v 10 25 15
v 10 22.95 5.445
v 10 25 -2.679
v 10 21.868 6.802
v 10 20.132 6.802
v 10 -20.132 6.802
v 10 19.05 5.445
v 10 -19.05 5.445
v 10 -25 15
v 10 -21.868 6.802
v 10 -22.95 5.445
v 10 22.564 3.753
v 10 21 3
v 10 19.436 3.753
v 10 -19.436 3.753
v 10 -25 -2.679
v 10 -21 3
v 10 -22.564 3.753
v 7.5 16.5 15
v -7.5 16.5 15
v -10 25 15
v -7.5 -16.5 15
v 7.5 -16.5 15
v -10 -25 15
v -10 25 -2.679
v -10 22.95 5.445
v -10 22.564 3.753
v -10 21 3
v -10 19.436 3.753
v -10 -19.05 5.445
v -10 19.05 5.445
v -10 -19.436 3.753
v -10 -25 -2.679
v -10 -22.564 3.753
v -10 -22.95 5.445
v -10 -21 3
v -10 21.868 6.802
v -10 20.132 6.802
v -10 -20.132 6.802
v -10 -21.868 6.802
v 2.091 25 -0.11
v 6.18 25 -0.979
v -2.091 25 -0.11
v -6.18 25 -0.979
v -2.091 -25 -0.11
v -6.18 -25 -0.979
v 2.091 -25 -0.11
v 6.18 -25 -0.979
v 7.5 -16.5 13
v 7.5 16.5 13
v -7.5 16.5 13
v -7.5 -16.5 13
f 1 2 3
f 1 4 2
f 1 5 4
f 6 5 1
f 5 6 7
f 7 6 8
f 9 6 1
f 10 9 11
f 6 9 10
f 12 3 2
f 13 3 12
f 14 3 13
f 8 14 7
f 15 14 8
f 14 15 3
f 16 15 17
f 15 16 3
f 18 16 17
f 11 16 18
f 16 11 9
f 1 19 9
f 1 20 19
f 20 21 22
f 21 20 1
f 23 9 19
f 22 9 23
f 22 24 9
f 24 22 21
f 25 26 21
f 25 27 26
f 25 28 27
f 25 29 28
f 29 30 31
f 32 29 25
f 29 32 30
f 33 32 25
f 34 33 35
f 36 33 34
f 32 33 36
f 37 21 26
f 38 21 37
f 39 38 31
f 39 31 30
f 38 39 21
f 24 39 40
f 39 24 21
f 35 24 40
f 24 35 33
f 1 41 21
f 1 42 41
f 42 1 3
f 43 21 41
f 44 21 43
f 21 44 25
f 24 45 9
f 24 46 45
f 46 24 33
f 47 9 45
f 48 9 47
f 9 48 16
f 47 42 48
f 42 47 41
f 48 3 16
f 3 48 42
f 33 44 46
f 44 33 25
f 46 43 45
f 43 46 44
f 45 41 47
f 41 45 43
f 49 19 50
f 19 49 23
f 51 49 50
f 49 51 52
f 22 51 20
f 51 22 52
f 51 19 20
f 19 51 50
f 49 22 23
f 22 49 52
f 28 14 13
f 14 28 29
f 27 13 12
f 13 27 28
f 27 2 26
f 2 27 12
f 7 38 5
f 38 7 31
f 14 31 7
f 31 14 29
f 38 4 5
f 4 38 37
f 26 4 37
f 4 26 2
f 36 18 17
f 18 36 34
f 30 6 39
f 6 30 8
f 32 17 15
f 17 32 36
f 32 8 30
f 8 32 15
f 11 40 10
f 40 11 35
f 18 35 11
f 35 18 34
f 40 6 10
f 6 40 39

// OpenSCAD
difference(){
    cube([20,50,30],center = true);
    
    translate([0,0,-20]){
        rotate([90,0,0]){
            cylinder(h=60, r=20, center=true);
        }
    }
    translate([0,0,15]){
        cube([15, 33, 4],center=true);
    }
    
    translate([0,21,5]){
        rotate([0,90,0]){
            cylinder(h=60, r=2, center=true);
        }
    }
        translate([0,-21,5]){
        rotate([0,90,0]){
            cylinder(h=60, r=2, center=true);
        }
    }
}
